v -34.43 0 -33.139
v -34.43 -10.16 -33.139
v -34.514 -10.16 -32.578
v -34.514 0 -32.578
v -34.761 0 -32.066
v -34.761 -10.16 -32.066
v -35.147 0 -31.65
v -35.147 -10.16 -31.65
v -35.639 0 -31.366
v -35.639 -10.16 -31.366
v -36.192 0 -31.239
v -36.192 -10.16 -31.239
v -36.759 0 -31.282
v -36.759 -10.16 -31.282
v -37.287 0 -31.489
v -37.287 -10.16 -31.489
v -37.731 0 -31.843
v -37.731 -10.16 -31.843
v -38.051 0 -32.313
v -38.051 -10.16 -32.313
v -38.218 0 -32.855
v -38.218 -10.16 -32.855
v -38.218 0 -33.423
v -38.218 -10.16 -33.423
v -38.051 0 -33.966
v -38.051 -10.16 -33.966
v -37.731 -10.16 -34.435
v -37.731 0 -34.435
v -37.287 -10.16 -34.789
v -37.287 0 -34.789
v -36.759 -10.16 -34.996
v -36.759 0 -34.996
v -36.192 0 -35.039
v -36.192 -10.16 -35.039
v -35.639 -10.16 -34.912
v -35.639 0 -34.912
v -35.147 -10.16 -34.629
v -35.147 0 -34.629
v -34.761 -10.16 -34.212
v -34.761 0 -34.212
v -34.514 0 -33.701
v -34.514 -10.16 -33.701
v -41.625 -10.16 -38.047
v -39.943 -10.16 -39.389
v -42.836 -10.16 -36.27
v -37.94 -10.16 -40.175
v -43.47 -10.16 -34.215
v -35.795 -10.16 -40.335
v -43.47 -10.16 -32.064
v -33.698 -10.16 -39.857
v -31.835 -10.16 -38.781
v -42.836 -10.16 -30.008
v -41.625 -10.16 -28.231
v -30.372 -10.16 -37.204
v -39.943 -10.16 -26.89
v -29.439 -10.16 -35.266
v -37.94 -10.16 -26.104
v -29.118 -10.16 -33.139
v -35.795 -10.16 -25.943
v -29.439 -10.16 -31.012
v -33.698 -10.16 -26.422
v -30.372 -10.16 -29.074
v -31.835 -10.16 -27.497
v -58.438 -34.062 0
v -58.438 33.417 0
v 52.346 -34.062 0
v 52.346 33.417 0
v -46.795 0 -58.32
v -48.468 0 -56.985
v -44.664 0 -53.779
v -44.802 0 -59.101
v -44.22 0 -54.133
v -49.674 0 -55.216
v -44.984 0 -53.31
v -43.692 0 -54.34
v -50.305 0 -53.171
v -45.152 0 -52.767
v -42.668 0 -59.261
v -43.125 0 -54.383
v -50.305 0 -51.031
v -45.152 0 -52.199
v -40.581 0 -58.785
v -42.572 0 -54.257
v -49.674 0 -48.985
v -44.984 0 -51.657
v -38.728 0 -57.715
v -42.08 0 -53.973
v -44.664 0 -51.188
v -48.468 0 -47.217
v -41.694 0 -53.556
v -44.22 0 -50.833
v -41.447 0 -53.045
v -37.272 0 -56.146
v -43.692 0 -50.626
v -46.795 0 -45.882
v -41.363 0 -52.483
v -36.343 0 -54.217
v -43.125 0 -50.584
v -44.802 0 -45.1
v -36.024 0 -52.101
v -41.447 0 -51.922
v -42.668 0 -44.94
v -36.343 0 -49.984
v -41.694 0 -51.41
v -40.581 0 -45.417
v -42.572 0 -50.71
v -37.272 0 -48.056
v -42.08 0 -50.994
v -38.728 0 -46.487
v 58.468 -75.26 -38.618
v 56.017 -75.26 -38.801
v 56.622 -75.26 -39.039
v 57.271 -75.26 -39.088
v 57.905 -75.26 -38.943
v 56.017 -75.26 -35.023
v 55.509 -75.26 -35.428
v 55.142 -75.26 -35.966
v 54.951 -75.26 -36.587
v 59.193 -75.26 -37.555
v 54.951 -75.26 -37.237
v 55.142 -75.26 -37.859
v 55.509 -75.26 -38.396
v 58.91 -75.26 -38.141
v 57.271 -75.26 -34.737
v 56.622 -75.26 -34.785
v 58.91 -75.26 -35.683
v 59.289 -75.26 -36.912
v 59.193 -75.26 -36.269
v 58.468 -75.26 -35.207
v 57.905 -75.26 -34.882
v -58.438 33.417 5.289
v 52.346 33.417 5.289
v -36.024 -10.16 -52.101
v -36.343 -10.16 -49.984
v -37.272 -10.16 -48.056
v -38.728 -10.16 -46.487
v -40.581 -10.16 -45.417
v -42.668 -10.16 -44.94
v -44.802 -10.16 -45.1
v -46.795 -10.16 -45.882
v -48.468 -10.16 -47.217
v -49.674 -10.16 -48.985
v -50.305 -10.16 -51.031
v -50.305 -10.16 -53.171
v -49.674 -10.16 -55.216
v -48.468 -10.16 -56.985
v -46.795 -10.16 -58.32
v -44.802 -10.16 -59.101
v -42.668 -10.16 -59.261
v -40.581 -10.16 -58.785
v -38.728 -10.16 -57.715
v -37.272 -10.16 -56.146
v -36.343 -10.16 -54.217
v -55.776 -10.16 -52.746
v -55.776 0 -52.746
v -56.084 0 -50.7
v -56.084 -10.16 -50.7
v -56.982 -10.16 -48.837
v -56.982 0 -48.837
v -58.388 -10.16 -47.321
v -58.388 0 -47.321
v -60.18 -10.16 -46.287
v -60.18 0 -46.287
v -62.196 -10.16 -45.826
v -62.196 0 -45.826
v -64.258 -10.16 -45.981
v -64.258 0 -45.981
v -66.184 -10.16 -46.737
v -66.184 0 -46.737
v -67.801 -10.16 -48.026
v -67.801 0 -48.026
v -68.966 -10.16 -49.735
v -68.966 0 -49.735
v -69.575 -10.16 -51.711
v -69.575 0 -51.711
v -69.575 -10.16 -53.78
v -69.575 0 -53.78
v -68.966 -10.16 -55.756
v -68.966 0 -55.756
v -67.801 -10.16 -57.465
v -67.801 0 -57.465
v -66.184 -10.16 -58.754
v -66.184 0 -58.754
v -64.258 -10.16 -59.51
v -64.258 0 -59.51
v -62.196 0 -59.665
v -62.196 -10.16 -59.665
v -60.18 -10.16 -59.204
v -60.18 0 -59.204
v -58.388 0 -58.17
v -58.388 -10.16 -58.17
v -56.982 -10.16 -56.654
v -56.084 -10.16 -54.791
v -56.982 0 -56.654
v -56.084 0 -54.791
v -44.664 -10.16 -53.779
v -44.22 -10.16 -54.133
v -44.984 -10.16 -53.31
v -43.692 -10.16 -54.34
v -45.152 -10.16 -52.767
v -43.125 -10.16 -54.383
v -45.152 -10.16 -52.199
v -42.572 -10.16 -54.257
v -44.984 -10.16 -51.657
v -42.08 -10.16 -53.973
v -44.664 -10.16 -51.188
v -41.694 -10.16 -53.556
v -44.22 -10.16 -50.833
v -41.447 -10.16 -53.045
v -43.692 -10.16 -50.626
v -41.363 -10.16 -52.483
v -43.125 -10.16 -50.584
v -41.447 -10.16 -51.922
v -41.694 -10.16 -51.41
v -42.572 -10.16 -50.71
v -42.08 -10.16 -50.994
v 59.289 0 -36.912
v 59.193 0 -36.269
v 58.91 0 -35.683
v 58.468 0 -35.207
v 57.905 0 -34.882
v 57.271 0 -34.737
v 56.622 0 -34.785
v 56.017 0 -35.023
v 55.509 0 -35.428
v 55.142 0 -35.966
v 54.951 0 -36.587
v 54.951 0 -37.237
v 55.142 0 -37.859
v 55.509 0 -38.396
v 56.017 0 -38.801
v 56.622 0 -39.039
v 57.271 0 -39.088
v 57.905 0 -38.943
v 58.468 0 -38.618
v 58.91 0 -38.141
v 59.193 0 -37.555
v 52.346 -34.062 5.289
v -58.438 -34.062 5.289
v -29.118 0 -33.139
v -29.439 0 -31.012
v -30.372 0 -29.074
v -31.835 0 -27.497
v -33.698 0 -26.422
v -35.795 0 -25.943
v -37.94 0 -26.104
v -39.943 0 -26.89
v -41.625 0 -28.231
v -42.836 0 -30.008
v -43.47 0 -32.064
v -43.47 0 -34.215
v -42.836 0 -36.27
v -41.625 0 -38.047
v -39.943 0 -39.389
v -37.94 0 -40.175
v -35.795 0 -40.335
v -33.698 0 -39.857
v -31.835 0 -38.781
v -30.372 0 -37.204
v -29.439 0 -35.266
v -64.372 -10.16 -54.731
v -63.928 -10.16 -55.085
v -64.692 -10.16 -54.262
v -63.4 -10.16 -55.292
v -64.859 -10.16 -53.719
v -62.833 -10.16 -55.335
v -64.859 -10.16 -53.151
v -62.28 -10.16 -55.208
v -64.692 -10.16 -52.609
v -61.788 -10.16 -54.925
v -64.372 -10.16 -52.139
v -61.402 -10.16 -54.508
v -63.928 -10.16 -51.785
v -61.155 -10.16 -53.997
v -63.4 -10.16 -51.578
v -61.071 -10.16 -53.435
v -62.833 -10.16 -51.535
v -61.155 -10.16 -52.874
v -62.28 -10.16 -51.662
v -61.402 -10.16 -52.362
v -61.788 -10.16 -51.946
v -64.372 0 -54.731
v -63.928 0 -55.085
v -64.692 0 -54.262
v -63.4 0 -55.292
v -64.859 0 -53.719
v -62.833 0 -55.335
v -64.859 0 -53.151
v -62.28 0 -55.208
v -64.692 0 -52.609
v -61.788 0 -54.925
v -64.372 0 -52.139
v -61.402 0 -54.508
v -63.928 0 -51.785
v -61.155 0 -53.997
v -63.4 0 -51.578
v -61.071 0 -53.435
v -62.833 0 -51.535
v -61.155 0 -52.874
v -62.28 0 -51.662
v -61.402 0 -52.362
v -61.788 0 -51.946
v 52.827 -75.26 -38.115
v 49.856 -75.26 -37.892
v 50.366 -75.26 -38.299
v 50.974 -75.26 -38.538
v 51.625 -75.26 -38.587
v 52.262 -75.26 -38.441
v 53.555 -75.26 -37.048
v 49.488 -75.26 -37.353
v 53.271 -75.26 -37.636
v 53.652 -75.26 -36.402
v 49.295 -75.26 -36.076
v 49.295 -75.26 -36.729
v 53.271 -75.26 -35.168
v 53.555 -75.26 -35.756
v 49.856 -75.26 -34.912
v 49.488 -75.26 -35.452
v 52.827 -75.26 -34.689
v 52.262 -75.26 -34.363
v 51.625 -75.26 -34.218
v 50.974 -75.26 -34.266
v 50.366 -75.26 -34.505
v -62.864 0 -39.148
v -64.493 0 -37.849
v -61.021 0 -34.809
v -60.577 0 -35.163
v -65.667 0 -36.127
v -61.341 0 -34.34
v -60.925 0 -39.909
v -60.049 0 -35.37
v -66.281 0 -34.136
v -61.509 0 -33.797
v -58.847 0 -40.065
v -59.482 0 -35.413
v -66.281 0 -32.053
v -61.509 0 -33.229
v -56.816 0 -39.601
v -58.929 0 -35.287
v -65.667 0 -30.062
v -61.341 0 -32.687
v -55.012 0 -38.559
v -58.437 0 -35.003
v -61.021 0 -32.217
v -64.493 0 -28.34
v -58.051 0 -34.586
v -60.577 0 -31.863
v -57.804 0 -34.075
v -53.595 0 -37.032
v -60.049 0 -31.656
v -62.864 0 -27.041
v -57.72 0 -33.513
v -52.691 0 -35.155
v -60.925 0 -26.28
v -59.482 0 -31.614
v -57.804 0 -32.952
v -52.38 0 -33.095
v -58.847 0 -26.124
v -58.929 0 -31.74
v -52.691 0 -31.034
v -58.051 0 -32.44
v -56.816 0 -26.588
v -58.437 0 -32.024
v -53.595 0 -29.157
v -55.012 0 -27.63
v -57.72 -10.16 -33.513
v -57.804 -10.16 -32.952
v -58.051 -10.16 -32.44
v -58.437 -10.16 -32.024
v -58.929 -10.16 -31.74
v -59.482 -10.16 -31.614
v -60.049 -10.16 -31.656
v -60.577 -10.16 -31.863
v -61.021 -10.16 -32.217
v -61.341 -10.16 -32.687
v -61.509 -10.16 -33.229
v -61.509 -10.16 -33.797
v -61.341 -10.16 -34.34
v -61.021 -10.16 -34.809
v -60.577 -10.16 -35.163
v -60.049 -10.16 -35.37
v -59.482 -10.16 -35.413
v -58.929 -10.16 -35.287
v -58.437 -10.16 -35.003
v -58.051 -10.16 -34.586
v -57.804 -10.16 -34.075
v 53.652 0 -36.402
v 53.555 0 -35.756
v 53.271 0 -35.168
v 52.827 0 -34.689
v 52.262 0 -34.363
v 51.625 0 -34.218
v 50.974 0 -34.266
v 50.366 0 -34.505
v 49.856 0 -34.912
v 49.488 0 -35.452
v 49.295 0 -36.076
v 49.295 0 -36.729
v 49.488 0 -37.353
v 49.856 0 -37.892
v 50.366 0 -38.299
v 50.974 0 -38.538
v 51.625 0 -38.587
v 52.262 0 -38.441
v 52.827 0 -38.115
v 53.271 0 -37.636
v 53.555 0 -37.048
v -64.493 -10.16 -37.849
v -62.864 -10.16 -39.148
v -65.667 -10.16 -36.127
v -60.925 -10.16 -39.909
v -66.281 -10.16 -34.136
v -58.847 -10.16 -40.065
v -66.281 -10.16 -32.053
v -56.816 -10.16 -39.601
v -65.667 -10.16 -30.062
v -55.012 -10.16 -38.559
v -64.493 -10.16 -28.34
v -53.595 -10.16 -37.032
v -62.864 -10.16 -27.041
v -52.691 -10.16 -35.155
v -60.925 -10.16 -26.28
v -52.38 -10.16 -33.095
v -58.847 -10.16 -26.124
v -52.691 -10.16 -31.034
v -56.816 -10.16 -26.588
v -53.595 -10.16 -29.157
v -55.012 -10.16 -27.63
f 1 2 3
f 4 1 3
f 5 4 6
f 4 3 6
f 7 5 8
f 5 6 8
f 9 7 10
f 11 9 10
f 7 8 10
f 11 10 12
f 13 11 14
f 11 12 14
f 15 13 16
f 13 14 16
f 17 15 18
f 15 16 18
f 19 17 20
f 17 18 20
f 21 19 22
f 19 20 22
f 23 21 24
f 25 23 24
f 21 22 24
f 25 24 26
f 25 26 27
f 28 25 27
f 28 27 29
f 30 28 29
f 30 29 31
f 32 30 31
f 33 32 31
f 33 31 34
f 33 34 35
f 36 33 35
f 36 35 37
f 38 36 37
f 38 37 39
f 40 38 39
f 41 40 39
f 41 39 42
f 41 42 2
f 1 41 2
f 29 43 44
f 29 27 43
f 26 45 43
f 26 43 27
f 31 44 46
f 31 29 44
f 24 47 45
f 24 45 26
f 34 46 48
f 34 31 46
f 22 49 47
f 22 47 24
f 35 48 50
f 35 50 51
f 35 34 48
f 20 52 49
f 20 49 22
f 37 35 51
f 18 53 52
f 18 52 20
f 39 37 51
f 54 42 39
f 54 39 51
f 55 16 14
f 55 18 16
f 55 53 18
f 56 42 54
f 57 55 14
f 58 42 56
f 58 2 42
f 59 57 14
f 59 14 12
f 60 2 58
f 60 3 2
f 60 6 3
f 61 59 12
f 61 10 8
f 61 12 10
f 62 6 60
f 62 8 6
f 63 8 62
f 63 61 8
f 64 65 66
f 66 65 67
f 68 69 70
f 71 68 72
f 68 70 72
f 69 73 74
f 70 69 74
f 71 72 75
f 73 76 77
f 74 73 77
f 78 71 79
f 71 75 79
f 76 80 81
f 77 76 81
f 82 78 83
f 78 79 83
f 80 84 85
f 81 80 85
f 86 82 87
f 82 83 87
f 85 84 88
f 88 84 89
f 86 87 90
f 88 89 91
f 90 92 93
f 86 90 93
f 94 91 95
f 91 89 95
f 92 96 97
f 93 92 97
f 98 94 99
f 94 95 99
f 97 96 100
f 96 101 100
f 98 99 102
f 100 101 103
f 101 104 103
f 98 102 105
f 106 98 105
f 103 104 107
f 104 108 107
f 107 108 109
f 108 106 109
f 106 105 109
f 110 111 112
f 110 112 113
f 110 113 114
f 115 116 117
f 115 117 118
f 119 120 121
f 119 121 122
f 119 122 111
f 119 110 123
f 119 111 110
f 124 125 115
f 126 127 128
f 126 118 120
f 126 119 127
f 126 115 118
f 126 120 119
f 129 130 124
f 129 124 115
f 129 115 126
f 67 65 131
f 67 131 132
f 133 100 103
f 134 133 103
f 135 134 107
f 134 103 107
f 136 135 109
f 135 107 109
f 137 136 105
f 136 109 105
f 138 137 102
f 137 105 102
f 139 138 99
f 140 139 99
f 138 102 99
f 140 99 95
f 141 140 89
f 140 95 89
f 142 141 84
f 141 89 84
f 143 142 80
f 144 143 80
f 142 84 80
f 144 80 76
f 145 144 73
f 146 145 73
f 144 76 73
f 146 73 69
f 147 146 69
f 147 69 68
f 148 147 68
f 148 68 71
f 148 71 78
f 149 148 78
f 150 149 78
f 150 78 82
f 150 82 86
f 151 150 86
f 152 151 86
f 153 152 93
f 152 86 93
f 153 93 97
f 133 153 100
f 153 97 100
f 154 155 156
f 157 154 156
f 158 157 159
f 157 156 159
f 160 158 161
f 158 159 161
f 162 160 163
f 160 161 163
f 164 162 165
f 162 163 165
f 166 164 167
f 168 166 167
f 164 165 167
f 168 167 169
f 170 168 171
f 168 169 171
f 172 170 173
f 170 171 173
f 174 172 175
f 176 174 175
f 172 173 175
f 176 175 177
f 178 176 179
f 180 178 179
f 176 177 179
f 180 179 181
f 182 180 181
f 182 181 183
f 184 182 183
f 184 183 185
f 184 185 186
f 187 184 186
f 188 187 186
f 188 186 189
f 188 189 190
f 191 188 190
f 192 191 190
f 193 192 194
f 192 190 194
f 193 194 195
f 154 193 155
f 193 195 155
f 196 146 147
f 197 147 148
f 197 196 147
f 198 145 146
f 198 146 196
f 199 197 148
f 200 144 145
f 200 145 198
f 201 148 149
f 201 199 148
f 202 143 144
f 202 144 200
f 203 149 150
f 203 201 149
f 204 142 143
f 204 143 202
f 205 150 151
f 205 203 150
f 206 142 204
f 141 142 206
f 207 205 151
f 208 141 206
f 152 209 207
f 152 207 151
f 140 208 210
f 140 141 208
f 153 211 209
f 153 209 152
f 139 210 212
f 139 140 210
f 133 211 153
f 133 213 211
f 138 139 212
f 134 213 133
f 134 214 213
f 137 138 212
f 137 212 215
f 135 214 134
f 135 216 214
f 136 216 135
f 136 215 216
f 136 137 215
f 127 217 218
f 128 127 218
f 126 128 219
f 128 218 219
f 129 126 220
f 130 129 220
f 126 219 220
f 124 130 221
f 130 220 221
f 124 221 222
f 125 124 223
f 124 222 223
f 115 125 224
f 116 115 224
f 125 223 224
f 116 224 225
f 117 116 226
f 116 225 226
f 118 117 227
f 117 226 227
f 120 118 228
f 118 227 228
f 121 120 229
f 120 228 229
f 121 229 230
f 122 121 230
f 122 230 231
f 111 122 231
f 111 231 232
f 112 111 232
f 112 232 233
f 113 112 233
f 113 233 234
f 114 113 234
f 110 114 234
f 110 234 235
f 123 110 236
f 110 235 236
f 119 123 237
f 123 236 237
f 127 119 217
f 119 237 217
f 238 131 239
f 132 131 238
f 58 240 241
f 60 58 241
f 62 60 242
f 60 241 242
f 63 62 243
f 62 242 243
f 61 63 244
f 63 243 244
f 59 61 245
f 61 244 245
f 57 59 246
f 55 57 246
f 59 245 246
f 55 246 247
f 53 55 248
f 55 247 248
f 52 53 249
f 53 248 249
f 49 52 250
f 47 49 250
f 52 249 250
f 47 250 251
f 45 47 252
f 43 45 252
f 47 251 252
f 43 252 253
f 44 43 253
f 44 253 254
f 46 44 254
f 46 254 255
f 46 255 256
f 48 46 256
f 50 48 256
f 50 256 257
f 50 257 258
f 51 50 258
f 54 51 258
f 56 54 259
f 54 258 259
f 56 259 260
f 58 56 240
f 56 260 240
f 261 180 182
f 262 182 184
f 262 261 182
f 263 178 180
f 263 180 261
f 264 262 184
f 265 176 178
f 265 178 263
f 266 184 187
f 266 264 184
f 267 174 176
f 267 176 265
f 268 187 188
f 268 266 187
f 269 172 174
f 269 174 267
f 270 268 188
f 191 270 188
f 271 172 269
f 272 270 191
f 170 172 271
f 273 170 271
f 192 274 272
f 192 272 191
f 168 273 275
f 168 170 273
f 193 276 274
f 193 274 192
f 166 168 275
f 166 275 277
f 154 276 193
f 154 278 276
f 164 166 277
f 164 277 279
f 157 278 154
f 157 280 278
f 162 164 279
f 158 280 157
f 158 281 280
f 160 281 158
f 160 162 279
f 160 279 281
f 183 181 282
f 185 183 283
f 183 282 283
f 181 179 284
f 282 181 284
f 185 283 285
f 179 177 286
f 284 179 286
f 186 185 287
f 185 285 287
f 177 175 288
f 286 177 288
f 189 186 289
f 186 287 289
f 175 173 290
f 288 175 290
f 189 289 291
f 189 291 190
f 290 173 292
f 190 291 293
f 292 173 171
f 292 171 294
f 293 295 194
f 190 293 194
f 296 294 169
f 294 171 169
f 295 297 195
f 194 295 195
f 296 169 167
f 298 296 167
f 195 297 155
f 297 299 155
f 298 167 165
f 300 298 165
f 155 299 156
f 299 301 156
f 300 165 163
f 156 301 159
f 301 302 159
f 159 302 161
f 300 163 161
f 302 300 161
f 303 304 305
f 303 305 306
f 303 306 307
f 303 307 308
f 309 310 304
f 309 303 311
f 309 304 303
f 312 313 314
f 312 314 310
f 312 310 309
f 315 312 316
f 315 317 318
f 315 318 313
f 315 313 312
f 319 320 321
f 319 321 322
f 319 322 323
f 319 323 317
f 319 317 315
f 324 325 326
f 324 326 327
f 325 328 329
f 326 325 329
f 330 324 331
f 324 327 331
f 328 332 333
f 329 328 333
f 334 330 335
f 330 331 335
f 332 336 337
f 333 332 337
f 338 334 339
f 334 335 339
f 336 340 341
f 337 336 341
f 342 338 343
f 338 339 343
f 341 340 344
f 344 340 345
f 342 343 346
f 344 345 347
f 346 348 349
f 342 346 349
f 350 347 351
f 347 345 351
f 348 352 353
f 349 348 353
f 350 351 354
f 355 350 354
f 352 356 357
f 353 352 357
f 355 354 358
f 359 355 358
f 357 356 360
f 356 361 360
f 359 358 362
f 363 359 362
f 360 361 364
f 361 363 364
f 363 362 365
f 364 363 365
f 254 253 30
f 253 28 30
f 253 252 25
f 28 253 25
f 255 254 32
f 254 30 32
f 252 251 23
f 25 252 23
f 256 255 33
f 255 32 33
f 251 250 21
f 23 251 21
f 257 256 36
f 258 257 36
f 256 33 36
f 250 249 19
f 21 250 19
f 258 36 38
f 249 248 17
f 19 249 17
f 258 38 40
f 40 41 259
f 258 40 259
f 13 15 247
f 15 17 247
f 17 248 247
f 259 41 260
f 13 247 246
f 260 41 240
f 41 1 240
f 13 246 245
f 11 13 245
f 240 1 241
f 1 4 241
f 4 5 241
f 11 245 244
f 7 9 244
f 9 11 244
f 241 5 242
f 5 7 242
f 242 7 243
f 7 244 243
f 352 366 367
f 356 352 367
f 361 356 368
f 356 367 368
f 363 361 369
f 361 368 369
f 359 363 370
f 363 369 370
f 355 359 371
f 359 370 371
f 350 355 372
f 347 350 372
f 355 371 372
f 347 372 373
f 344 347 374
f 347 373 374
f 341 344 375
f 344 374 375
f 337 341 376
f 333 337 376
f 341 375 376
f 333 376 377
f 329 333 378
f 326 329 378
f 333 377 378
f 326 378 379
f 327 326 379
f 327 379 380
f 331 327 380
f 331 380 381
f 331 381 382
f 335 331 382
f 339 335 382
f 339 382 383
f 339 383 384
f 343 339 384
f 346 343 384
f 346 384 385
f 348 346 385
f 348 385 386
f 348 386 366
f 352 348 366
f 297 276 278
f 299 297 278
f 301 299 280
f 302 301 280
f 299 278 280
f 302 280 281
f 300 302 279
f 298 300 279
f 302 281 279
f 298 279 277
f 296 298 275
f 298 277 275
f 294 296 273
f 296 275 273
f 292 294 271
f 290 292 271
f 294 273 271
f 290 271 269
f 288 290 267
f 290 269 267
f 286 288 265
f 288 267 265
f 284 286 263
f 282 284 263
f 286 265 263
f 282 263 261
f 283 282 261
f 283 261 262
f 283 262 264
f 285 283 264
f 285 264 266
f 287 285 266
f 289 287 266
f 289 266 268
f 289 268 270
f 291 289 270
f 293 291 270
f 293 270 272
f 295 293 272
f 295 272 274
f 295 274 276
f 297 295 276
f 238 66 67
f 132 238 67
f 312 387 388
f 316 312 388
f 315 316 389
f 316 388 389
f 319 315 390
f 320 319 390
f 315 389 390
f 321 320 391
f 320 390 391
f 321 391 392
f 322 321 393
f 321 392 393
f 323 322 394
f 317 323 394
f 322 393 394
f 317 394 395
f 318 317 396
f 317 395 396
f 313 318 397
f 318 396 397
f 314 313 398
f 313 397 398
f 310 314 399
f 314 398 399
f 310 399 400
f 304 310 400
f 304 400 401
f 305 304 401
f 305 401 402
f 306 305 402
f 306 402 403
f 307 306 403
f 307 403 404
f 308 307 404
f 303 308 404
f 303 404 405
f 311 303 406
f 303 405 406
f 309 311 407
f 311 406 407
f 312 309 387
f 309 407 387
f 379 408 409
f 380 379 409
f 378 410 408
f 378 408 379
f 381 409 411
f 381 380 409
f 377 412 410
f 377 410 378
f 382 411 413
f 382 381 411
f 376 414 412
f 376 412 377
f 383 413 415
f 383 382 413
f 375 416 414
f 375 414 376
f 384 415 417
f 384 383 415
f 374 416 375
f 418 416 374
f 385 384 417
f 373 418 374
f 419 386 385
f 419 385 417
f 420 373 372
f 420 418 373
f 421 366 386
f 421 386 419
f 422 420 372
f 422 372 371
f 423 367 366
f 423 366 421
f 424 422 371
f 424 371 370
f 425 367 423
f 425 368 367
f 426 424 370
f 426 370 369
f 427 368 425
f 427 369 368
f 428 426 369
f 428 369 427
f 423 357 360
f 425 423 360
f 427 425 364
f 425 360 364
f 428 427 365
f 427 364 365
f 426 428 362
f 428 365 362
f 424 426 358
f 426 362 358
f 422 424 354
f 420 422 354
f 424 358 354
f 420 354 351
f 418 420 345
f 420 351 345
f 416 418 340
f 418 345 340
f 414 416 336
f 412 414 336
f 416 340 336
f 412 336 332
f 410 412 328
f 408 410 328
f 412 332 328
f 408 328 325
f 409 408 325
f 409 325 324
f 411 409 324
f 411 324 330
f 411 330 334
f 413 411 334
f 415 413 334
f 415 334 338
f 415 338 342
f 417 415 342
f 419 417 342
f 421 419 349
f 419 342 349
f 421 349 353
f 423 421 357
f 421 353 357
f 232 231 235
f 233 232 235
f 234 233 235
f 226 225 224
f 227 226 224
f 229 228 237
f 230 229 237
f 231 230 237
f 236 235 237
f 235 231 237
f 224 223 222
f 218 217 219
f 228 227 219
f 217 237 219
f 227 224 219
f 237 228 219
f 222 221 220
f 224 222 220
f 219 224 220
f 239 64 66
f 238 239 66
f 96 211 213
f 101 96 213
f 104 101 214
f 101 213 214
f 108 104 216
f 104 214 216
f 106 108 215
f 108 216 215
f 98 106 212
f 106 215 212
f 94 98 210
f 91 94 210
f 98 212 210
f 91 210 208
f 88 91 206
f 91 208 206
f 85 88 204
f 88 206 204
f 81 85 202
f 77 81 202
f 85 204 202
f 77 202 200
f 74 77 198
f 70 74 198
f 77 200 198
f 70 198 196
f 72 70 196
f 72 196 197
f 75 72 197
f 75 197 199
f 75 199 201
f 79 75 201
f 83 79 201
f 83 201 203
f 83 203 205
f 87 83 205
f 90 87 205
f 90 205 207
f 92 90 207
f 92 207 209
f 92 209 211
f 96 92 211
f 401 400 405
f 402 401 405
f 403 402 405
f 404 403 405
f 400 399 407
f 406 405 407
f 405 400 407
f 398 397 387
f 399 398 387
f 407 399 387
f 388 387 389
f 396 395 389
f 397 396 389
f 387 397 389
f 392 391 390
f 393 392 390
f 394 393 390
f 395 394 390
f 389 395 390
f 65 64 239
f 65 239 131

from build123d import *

# Parameters (mm, degrees)
F0_W     = 110.7842847705
F0_H     = 67.478954792
F1_DEPTH = 5.28892
F2_R     = 2.1815082671
F3_DEPTH = 75.25969
F2_R_2   = 2.1905469229
F4_R     = 8.0140895642
F5_DEPTH = 10.16
F4_R_2   = 7.6854396297
F8_R     = 6.9384570924
F9_DEPTH = 10.16
F8_R_2   = 7.1806103859
F8_R_3   = 6.9896641343
F8_R_4   = 7.2163002878
F11_D    = 3.81
F11_2_D  = 3.81
F11_3_D  = 3.81
F11_4_D  = 3.81


with BuildPart() as f1:
    # F0 (on Top) → F1 (new body)
    with BuildSketch(Plane.XY):
        with Locations((-3.0461288989, -0.3221817315)):
            Rectangle(F0_W, F0_H)
    extrude(amount=F1_DEPTH)


with BuildPart() as f3:
    # F2 (on Front) → F3 (new body)
    with BuildSketch(Plane.XZ):
        with Locations((57.1079216897, -36.9122102857)):
            Circle(F2_R)
    extrude(amount=F3_DEPTH)


with BuildPart() as f3b:
    # F2 (on Front) → F3, piece 2 (new body)
    with BuildSketch(Plane.XZ):
        with Locations((51.4614060521, -36.4021025598)):
            Circle(F2_R_2)
    extrude(amount=F3_DEPTH)


with BuildPart() as f5:
    # F4 (on Front) → F5 (new body)
    with BuildSketch(Plane.XZ):
        with Locations((-34.715604037, -49.3302866817)):
            Circle(F4_R)
    extrude(amount=F5_DEPTH)


with BuildPart() as f5b:
    # F4 (on Front) → F5, piece 2 (new body)
    with BuildSketch(Plane.XZ):
        with Locations((-53.678587079, -50.7312454283)):
            Circle(F4_R_2)
    extrude(amount=F5_DEPTH)


with BuildPart() as f9:
    # F8 (on Front) → F9 (new body)
    with BuildSketch(Plane.XZ):
        with Locations((-62.714509666, -52.7455173433)):
            Circle(F8_R)
    extrude(amount=F9_DEPTH)

    # F11 (through all)
    with Locations(Plane(origin=(0, 0, 0), x_dir=(-1, 0, 0), z_dir=(0, 1, 0))):
        with Locations((36.3346636295, -33.1391692162), (59.62478742, -33.5132144392), (62.9757493734, -53.4351728857), (43.2678461075, -52.4832382798)):
            Hole(F11_D / 2)


with BuildPart() as f9b:
    # F8 (on Front) → F9, piece 2 (new body)
    with BuildSketch(Plane.XZ):
        with Locations((-43.2045944035, -52.1009117365)):
            Circle(F8_R_2)
    extrude(amount=F9_DEPTH)

    # F11#2 (through all)
    with Locations(Plane(origin=(0, 0, 0), x_dir=(-1, 0, 0), z_dir=(0, 1, 0))):
        with Locations((36.3346636295, -33.1391692162), (59.62478742, -33.5132144392), (62.9757493734, -53.4351728857), (43.2678461075, -52.4832382798)):
            Hole(F11_2_D / 2)


with BuildPart() as f9c:
    # F8 (on Front) → F9, piece 3 (new body)
    with BuildSketch(Plane.XZ):
        with Locations((-59.3696497381, -33.0945327878)):
            Circle(F8_R_3)
    extrude(amount=F9_DEPTH)

    # F11#3 (through all)
    with Locations(Plane(origin=(0, 0, 0), x_dir=(-1, 0, 0), z_dir=(0, 1, 0))):
        with Locations((36.3346636295, -33.1391692162), (59.62478742, -33.5132144392), (62.9757493734, -53.4351728857), (43.2678461075, -52.4832382798)):
            Hole(F11_3_D / 2)


with BuildPart() as f9d:
    # F8 (on Front) → F9, piece 4 (new body)
    with BuildSketch(Plane.XZ):
        with Locations((-36.3346636295, -33.1391692162)):
            Circle(F8_R_4)
    extrude(amount=F9_DEPTH)

    # F11#4 (through all)
    with Locations(Plane(origin=(0, 0, 0), x_dir=(-1, 0, 0), z_dir=(0, 1, 0))):
        with Locations((36.3346636295, -33.1391692162), (59.62478742, -33.5132144392), (62.9757493734, -53.4351728857), (43.2678461075, -52.4832382798)):
            Hole(F11_4_D / 2)


solid = Compound([f1.part, f3.part, f3b.part, f9.part, f9b.part, f9c.part, f9d.part])
